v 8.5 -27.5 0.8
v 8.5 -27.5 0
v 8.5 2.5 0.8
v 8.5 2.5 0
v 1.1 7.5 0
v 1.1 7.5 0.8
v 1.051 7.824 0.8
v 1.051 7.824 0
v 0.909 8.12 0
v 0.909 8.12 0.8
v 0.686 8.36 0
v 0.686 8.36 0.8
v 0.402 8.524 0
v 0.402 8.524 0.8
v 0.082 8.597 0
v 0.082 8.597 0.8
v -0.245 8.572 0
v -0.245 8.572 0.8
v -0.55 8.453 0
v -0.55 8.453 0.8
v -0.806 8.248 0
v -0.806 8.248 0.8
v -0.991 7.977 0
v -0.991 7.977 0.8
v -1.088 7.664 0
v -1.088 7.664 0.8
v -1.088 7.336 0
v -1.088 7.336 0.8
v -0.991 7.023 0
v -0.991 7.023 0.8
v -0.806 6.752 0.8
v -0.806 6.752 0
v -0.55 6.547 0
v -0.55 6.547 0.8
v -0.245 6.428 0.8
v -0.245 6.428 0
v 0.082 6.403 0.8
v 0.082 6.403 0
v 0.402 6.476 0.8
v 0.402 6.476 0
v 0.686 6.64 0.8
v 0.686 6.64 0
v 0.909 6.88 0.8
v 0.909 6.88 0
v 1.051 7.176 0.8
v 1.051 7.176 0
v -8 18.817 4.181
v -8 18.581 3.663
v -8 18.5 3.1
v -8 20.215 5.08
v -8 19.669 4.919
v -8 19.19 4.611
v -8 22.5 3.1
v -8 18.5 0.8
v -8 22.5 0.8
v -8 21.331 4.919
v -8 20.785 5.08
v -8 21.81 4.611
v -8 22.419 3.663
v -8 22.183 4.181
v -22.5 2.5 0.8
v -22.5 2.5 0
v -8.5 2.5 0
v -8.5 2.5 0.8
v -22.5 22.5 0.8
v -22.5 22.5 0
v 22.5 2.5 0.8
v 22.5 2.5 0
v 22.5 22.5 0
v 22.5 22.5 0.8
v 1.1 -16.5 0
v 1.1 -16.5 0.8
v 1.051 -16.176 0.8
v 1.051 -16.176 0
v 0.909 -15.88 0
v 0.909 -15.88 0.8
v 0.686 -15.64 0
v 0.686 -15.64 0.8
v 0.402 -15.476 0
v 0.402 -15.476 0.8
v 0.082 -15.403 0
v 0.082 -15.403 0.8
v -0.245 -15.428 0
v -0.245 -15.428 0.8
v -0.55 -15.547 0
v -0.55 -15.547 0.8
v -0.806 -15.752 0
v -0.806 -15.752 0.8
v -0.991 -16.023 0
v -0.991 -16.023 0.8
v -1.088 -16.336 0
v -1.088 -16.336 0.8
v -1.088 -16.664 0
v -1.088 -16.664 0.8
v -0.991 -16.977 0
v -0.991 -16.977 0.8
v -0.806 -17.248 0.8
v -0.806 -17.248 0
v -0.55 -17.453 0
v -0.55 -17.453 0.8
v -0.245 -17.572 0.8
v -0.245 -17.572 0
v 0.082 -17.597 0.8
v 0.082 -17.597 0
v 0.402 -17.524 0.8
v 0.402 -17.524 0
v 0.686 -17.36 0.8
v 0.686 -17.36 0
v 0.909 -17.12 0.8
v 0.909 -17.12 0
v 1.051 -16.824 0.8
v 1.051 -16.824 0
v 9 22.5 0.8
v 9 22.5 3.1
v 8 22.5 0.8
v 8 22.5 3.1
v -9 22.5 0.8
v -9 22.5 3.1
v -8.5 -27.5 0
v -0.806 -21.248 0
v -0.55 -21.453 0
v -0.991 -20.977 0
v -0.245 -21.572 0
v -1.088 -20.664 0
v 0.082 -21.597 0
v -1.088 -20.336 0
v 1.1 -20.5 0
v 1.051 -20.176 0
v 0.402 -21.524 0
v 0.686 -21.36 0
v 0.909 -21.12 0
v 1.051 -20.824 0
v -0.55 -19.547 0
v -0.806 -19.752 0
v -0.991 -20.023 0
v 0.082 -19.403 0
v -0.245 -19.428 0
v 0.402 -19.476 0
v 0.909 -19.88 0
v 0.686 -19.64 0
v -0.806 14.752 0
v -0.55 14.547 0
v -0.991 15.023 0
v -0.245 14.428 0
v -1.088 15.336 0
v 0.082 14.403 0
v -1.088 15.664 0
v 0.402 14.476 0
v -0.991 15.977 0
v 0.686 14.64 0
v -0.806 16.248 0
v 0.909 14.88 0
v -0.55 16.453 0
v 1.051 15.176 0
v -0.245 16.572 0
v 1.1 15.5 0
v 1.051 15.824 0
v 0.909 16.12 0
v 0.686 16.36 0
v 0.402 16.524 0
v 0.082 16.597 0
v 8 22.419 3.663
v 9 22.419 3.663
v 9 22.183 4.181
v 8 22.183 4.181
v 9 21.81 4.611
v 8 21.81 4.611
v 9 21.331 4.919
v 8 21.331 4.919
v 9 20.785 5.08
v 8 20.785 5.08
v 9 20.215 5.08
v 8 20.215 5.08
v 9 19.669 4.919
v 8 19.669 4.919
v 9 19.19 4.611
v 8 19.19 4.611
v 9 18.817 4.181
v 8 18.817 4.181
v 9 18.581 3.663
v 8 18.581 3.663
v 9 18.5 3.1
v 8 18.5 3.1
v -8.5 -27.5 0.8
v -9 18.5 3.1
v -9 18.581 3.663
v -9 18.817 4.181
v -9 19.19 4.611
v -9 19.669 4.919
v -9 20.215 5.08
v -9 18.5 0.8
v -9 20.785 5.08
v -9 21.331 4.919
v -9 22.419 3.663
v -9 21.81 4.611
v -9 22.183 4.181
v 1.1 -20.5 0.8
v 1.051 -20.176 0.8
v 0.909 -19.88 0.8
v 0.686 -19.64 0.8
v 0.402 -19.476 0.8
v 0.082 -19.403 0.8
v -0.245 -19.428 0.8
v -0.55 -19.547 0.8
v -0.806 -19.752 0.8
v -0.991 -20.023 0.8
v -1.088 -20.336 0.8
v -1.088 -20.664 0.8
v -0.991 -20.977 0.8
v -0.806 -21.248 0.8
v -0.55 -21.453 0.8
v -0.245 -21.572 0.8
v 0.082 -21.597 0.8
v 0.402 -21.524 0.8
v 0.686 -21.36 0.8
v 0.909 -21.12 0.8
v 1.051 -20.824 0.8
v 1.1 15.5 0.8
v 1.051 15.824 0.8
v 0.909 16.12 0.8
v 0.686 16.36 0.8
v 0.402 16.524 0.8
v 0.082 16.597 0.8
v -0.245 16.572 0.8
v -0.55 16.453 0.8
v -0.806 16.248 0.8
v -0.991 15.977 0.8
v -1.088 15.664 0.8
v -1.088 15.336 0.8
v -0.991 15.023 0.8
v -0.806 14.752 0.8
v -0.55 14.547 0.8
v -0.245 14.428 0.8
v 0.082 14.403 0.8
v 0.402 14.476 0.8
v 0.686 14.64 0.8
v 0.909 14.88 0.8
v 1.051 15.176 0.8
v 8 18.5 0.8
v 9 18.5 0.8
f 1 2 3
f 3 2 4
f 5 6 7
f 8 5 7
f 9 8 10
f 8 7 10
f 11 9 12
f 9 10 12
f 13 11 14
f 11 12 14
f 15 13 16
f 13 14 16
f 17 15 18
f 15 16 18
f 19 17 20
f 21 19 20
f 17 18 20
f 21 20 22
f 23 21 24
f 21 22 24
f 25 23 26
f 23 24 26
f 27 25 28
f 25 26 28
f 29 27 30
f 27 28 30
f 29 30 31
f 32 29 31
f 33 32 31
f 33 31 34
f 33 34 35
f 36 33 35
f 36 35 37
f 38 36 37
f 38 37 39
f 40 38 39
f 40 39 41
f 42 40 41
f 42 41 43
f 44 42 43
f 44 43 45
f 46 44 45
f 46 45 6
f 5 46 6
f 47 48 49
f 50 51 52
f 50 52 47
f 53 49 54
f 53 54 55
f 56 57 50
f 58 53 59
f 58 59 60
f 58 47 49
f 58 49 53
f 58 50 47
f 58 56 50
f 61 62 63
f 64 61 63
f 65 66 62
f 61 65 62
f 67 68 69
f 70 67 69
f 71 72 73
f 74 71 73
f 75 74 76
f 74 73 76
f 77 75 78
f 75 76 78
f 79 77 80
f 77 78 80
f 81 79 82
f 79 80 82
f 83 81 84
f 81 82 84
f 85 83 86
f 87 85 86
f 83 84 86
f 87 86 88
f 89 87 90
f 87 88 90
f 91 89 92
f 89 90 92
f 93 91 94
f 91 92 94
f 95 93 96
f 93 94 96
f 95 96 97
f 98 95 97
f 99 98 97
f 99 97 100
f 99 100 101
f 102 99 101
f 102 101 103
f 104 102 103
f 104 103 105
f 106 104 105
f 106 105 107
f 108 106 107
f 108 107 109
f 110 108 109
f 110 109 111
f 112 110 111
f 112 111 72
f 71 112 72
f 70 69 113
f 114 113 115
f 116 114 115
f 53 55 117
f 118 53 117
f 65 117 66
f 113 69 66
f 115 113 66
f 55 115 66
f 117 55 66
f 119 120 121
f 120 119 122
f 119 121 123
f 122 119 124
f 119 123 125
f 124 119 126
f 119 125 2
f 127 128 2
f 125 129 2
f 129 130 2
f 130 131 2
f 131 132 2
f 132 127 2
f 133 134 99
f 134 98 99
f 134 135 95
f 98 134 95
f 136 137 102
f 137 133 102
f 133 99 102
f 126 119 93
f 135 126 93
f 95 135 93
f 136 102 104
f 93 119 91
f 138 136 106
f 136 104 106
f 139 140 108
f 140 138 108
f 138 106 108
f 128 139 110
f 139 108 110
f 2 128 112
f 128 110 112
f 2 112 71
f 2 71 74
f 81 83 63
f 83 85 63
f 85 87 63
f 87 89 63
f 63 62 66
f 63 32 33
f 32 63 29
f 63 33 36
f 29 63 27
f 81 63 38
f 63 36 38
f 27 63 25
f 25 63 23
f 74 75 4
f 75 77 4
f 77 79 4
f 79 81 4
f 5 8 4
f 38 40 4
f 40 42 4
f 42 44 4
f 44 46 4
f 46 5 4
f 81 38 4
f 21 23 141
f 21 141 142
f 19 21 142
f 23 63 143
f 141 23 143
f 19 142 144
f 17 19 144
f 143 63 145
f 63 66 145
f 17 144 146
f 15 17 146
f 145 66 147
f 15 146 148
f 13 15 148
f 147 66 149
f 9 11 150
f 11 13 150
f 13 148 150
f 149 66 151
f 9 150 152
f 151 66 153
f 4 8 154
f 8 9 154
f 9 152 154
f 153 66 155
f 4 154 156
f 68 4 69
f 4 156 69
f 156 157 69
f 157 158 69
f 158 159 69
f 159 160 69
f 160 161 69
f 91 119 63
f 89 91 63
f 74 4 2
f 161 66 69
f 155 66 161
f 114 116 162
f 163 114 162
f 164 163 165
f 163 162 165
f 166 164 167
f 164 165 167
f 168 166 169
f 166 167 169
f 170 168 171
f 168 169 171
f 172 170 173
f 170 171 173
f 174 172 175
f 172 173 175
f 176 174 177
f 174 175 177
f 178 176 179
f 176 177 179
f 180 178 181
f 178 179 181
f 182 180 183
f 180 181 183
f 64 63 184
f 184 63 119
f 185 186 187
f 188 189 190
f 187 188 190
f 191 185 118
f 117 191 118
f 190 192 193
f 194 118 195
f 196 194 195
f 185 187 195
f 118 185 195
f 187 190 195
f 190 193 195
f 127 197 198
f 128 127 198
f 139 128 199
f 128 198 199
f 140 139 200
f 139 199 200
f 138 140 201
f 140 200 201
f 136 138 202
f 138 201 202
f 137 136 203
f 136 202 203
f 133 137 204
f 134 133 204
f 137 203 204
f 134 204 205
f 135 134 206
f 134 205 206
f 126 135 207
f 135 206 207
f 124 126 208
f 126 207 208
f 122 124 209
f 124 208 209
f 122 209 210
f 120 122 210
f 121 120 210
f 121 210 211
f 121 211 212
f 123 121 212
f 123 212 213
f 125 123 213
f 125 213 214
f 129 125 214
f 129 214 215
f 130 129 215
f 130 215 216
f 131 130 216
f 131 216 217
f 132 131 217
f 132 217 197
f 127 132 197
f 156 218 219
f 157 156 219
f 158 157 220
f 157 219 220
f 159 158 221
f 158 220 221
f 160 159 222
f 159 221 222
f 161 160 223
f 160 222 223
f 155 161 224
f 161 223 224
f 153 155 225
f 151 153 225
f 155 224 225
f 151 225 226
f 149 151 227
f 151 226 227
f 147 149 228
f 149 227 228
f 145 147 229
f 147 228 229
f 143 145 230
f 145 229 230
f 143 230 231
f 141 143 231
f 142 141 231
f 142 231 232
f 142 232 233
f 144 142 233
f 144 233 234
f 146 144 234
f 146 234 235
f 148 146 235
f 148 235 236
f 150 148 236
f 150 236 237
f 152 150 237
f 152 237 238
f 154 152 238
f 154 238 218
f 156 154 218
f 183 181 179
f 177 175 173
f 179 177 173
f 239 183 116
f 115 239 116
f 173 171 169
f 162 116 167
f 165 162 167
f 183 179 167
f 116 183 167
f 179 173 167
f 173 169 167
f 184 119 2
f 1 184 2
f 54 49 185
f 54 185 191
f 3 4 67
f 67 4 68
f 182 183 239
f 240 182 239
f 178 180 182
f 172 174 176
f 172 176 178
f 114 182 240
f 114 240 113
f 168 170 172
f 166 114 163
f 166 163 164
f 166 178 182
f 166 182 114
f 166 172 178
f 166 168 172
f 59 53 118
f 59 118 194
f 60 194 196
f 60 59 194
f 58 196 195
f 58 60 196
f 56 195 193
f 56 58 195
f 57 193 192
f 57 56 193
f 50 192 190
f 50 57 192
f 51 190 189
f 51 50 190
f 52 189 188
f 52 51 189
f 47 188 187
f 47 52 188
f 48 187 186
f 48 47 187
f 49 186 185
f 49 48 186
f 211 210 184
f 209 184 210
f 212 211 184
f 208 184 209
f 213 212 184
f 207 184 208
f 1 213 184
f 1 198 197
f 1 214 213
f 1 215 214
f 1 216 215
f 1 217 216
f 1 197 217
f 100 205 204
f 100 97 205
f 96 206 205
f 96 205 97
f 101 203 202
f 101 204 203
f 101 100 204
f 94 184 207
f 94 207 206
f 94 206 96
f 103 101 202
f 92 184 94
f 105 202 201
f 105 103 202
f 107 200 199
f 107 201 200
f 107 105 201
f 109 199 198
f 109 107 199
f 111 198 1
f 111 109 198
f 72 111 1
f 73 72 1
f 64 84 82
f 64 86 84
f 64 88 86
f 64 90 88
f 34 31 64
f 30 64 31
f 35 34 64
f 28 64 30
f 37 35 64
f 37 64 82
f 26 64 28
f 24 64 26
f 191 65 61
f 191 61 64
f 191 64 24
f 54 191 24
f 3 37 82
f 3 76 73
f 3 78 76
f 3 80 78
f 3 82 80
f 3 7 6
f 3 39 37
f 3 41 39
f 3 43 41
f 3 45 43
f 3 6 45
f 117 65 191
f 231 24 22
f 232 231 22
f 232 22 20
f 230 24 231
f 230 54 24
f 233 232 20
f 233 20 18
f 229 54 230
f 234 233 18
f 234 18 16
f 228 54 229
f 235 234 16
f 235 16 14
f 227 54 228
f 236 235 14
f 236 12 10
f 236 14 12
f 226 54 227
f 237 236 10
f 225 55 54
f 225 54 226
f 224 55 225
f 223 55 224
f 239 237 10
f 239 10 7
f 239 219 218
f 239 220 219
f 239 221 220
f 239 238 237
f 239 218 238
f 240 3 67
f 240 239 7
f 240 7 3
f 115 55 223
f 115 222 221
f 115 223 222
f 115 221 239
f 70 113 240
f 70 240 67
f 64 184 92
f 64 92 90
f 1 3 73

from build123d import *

# Parameters (mm, degrees)
F1_DEPTH = 0.8
F4_DEPTH = 1
F6_R     = 1.1
F7_DEPTH = 0.801


with BuildPart() as f1:
    # F0 (on Top) → F1 (new body)
    with BuildSketch(Plane.XY):
        Polygon((-8.5, 2.5), (-8.5, -27.5), (8.5, -27.5), (8.5, 2.5), (22.5, 2.5), (22.5, 22.5), (-22.5, 22.5), (-22.5, 2.5), align=None)
    extrude(amount=F1_DEPTH)

    # F3 (on offset) → F4 (join)
    with BuildSketch(Plane.YZ.offset(8)):
        with BuildLine():
            Line((18.5, 3.1), (18.5, 0.8))
            Line((18.5, 0.8), (22.5, 0.8))
            Line((22.5, 0.8), (22.5, 3.1))
            ThreePointArc((22.5, 3.1), (20.5, 5.1), (18.5, 3.1))
        make_face()
    extrude(amount=F4_DEPTH)

    # F5: F1 across plane


with BuildPart() as f1_1:
    add(f1.part)
    add(f1.part.mirror(Plane.YZ))

    # F6 (on face) → F7 (cut, through all)
    with BuildSketch(Plane.XY.offset(0.8)):
        with Locations((0, 15.5)):
            Circle(F6_R)
        with Locations((0, 7.5)):
            Circle(F6_R)
        with Locations((0, -16.5)):
            Circle(F6_R)
        with Locations((0, -20.5)):
            Circle(F6_R)
    extrude(amount=-F7_DEPTH, mode=Mode.SUBTRACT)


solid = f1_1.part
